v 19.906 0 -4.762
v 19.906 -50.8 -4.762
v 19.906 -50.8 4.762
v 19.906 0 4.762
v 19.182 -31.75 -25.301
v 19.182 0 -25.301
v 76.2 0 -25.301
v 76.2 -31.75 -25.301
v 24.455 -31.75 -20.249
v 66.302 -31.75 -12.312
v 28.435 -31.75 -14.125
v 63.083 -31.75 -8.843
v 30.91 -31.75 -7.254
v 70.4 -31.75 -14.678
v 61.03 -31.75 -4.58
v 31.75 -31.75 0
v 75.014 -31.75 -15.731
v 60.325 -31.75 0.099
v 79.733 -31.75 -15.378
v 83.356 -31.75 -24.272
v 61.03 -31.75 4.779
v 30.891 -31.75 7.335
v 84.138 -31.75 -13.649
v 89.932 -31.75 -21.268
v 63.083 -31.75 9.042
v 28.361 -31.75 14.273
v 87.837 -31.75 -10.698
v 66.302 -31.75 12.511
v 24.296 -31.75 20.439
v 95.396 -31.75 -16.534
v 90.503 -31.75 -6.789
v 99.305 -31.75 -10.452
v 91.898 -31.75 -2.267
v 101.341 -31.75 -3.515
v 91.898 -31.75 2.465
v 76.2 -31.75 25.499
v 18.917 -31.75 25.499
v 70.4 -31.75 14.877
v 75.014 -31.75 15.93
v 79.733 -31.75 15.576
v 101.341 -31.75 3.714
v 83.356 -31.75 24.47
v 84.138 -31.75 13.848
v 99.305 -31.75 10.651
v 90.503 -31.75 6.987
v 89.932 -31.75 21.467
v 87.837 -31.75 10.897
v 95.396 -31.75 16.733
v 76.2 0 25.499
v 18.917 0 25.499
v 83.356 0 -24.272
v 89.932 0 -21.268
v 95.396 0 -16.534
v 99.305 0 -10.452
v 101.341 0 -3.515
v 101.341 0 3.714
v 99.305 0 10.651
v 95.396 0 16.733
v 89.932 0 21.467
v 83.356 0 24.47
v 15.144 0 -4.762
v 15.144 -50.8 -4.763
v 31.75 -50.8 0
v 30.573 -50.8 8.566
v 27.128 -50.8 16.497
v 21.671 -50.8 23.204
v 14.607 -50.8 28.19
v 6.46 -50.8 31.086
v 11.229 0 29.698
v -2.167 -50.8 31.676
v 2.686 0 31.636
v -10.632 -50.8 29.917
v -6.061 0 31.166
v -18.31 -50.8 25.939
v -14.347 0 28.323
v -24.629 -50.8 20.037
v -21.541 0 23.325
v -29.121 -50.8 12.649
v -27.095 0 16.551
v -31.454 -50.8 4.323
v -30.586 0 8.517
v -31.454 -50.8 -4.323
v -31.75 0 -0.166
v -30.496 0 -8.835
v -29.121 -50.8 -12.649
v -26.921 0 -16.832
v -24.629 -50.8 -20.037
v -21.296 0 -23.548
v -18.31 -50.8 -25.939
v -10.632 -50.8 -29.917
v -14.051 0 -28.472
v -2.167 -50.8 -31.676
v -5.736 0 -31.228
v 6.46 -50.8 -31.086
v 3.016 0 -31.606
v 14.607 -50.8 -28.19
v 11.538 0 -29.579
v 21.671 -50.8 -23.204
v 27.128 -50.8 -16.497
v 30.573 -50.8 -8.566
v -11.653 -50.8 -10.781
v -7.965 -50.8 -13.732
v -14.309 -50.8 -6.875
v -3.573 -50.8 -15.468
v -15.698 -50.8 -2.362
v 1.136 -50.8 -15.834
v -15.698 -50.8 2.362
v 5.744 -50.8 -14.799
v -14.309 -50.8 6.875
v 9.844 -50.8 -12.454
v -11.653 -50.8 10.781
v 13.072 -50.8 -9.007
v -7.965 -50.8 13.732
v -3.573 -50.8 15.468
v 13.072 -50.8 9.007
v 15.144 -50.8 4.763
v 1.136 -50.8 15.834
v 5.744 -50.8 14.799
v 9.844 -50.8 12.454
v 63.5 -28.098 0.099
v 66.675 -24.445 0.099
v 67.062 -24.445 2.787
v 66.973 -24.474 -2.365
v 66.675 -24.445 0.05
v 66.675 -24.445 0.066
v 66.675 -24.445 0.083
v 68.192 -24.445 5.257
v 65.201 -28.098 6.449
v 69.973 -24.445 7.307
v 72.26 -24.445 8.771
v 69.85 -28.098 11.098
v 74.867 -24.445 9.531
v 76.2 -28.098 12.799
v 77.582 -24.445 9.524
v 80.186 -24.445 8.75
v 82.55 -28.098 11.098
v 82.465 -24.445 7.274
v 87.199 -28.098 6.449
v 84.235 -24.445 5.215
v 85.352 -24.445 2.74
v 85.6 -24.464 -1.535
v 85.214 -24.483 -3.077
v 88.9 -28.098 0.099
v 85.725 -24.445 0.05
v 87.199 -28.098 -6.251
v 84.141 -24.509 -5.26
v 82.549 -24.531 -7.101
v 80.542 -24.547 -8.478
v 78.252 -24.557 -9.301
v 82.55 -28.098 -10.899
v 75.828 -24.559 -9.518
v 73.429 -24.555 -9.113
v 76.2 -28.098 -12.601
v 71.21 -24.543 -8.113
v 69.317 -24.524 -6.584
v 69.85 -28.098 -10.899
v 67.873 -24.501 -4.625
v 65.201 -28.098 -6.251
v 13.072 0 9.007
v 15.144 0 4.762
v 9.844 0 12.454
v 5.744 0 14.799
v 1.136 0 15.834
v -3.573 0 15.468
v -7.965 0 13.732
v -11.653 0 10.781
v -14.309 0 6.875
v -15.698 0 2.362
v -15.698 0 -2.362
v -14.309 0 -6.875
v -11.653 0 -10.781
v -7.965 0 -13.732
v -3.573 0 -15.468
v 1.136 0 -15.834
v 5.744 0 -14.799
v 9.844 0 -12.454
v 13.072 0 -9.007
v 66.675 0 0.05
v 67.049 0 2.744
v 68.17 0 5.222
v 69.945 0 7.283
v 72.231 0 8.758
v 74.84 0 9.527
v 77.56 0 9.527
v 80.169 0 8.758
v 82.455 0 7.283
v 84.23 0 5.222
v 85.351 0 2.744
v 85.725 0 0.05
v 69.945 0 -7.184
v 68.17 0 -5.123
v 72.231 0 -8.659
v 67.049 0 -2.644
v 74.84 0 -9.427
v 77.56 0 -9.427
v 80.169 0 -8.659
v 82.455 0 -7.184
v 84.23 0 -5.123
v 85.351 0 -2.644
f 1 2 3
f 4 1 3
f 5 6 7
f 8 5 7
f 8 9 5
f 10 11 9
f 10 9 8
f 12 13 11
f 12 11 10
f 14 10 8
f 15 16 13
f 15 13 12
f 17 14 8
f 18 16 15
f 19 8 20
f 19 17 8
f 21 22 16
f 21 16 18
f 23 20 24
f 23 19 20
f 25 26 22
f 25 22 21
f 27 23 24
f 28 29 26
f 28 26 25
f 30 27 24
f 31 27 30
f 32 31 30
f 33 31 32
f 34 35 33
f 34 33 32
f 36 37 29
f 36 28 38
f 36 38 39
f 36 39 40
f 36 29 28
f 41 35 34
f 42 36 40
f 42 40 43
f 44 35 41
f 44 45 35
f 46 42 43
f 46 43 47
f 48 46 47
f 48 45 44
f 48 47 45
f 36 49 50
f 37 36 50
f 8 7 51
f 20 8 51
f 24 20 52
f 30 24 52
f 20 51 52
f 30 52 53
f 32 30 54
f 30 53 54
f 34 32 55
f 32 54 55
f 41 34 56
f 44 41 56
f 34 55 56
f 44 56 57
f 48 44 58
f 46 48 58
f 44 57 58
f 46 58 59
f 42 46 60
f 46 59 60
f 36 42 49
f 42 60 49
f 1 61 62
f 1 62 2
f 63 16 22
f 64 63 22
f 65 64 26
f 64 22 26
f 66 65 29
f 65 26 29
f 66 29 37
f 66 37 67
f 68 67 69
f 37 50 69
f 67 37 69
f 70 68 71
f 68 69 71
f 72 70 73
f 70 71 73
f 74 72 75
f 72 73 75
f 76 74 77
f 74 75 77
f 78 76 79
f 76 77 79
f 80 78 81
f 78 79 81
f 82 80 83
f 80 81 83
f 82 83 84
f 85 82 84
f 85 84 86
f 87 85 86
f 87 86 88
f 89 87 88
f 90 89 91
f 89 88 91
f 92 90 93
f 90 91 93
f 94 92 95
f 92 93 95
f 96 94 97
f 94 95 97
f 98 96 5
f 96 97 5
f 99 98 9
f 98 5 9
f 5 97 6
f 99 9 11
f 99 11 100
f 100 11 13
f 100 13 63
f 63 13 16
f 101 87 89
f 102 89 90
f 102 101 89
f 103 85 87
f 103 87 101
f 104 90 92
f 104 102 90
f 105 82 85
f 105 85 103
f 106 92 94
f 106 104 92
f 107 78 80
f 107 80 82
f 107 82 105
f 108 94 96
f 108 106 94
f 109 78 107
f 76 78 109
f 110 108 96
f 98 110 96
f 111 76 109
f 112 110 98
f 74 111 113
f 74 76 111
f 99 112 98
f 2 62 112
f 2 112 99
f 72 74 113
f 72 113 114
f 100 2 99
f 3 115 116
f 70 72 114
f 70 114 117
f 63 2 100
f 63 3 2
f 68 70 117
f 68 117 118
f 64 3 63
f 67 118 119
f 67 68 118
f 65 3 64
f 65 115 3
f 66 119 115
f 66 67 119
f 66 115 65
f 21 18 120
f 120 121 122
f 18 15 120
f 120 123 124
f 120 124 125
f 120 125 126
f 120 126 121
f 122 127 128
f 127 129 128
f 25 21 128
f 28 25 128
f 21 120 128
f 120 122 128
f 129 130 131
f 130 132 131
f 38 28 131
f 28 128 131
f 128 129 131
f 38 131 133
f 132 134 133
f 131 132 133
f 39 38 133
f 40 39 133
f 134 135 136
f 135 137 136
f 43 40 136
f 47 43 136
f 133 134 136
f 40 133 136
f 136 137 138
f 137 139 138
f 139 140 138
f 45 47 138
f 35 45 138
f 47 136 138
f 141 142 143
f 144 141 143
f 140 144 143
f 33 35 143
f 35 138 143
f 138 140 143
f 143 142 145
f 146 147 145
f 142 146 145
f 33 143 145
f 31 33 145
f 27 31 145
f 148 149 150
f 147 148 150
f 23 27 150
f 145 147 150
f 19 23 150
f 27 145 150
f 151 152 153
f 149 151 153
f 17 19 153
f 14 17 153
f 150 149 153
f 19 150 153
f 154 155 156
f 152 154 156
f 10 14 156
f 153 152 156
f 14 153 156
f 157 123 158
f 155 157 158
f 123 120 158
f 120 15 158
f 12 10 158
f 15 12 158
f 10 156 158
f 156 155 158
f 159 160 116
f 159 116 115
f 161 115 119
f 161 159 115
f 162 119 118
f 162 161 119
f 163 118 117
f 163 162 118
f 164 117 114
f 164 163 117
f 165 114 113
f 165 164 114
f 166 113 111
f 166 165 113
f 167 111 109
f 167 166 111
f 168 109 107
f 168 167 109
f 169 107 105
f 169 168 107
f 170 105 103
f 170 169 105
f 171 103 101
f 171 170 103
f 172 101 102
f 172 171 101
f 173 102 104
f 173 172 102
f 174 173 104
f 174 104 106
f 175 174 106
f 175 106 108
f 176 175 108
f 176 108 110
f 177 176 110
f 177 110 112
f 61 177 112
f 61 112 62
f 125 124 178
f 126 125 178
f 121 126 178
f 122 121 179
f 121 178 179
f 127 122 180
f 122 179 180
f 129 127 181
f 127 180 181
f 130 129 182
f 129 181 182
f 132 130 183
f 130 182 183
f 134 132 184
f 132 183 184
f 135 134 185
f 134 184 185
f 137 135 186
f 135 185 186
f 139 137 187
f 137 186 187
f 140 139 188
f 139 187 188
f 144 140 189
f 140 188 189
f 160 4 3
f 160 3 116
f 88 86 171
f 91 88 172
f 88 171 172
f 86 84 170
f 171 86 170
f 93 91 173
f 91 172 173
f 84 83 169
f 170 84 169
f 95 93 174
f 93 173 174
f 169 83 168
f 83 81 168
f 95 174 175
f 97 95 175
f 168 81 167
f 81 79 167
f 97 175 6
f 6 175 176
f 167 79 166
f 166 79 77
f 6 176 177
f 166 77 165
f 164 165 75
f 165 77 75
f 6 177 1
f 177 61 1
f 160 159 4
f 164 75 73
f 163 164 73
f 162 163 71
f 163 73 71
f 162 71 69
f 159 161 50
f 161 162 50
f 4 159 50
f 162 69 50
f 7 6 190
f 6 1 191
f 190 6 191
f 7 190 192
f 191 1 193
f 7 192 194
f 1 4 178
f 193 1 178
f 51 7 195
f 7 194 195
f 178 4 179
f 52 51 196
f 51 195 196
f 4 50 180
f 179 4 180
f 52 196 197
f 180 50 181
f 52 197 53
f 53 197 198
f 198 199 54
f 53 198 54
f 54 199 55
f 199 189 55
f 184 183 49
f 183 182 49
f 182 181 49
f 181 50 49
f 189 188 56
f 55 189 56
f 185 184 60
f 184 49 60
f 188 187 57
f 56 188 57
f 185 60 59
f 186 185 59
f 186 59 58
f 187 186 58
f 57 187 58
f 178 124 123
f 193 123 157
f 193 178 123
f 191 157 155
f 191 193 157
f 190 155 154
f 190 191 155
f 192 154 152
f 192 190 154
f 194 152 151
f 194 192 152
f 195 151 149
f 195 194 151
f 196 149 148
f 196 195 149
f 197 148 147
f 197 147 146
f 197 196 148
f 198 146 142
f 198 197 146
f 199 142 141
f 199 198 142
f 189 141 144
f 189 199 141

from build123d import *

# Parameters (mm, degrees)
F0_R           = 31.75
F0_R_2         = 15.875
F1_DEPTH       = 50.8
F2_R           = 9.525
F3_DEPTH       = 31.75
F5_D           = 19.05
F5_CSINK_D     = 31.75
F5_CSINK_ANGLE = 82
F7_DEPTH       = 76.2


with BuildPart() as f1:
    # F0 (on Front) → F1 (new body)
    with BuildSketch(Plane.XZ):
        Circle(F0_R)
        Circle(F0_R_2, mode=Mode.SUBTRACT)
    extrude(amount=F1_DEPTH)

    # F2 (on Front) → F3 (join)
    with BuildSketch(Plane.XZ):
        with BuildLine():
            Line((76.2, 25.49937), (18.47559, 25.49937))
            Line((18.47559, 25.49937), (18.47559, -25.30063))
            Line((18.47559, -25.30063), (76.2, -25.30063))
            ThreePointArc((76.2, -25.30063), (101.6, 0.09937), (76.2, 25.49937))
        make_face()
        with Locations((76.2, 0)):
            Circle(F2_R, mode=Mode.SUBTRACT)
    extrude(amount=F3_DEPTH)

    # F5 (through all)
    with Locations(Plane.XZ.offset(31.75)):
        with Locations((76.2, 0.09937)):
            CounterSinkHole(F5_D / 2, F5_CSINK_D / 2, counter_sink_angle=F5_CSINK_ANGLE)

    # F6 (on face) → F7 (cut)
    with BuildSketch(Plane.XZ.offset(50.8)):
        with BuildLine():
            ThreePointArc((15.875, 0), (15.691131, -2.409153), (15.143785, -4.7625))
            Line((15.143785, -4.7625), (19.906285, -4.7625))
            Line((19.906285, -4.7625), (19.906285, 4.7625))
            Line((19.906285, 4.7625), (15.143785, 4.7625))
            ThreePointArc((15.143785, 4.7625), (15.691131, 2.409153), (15.875, 0))
        make_face()
    extrude(amount=-F7_DEPTH, mode=Mode.SUBTRACT)


solid = f1.part
